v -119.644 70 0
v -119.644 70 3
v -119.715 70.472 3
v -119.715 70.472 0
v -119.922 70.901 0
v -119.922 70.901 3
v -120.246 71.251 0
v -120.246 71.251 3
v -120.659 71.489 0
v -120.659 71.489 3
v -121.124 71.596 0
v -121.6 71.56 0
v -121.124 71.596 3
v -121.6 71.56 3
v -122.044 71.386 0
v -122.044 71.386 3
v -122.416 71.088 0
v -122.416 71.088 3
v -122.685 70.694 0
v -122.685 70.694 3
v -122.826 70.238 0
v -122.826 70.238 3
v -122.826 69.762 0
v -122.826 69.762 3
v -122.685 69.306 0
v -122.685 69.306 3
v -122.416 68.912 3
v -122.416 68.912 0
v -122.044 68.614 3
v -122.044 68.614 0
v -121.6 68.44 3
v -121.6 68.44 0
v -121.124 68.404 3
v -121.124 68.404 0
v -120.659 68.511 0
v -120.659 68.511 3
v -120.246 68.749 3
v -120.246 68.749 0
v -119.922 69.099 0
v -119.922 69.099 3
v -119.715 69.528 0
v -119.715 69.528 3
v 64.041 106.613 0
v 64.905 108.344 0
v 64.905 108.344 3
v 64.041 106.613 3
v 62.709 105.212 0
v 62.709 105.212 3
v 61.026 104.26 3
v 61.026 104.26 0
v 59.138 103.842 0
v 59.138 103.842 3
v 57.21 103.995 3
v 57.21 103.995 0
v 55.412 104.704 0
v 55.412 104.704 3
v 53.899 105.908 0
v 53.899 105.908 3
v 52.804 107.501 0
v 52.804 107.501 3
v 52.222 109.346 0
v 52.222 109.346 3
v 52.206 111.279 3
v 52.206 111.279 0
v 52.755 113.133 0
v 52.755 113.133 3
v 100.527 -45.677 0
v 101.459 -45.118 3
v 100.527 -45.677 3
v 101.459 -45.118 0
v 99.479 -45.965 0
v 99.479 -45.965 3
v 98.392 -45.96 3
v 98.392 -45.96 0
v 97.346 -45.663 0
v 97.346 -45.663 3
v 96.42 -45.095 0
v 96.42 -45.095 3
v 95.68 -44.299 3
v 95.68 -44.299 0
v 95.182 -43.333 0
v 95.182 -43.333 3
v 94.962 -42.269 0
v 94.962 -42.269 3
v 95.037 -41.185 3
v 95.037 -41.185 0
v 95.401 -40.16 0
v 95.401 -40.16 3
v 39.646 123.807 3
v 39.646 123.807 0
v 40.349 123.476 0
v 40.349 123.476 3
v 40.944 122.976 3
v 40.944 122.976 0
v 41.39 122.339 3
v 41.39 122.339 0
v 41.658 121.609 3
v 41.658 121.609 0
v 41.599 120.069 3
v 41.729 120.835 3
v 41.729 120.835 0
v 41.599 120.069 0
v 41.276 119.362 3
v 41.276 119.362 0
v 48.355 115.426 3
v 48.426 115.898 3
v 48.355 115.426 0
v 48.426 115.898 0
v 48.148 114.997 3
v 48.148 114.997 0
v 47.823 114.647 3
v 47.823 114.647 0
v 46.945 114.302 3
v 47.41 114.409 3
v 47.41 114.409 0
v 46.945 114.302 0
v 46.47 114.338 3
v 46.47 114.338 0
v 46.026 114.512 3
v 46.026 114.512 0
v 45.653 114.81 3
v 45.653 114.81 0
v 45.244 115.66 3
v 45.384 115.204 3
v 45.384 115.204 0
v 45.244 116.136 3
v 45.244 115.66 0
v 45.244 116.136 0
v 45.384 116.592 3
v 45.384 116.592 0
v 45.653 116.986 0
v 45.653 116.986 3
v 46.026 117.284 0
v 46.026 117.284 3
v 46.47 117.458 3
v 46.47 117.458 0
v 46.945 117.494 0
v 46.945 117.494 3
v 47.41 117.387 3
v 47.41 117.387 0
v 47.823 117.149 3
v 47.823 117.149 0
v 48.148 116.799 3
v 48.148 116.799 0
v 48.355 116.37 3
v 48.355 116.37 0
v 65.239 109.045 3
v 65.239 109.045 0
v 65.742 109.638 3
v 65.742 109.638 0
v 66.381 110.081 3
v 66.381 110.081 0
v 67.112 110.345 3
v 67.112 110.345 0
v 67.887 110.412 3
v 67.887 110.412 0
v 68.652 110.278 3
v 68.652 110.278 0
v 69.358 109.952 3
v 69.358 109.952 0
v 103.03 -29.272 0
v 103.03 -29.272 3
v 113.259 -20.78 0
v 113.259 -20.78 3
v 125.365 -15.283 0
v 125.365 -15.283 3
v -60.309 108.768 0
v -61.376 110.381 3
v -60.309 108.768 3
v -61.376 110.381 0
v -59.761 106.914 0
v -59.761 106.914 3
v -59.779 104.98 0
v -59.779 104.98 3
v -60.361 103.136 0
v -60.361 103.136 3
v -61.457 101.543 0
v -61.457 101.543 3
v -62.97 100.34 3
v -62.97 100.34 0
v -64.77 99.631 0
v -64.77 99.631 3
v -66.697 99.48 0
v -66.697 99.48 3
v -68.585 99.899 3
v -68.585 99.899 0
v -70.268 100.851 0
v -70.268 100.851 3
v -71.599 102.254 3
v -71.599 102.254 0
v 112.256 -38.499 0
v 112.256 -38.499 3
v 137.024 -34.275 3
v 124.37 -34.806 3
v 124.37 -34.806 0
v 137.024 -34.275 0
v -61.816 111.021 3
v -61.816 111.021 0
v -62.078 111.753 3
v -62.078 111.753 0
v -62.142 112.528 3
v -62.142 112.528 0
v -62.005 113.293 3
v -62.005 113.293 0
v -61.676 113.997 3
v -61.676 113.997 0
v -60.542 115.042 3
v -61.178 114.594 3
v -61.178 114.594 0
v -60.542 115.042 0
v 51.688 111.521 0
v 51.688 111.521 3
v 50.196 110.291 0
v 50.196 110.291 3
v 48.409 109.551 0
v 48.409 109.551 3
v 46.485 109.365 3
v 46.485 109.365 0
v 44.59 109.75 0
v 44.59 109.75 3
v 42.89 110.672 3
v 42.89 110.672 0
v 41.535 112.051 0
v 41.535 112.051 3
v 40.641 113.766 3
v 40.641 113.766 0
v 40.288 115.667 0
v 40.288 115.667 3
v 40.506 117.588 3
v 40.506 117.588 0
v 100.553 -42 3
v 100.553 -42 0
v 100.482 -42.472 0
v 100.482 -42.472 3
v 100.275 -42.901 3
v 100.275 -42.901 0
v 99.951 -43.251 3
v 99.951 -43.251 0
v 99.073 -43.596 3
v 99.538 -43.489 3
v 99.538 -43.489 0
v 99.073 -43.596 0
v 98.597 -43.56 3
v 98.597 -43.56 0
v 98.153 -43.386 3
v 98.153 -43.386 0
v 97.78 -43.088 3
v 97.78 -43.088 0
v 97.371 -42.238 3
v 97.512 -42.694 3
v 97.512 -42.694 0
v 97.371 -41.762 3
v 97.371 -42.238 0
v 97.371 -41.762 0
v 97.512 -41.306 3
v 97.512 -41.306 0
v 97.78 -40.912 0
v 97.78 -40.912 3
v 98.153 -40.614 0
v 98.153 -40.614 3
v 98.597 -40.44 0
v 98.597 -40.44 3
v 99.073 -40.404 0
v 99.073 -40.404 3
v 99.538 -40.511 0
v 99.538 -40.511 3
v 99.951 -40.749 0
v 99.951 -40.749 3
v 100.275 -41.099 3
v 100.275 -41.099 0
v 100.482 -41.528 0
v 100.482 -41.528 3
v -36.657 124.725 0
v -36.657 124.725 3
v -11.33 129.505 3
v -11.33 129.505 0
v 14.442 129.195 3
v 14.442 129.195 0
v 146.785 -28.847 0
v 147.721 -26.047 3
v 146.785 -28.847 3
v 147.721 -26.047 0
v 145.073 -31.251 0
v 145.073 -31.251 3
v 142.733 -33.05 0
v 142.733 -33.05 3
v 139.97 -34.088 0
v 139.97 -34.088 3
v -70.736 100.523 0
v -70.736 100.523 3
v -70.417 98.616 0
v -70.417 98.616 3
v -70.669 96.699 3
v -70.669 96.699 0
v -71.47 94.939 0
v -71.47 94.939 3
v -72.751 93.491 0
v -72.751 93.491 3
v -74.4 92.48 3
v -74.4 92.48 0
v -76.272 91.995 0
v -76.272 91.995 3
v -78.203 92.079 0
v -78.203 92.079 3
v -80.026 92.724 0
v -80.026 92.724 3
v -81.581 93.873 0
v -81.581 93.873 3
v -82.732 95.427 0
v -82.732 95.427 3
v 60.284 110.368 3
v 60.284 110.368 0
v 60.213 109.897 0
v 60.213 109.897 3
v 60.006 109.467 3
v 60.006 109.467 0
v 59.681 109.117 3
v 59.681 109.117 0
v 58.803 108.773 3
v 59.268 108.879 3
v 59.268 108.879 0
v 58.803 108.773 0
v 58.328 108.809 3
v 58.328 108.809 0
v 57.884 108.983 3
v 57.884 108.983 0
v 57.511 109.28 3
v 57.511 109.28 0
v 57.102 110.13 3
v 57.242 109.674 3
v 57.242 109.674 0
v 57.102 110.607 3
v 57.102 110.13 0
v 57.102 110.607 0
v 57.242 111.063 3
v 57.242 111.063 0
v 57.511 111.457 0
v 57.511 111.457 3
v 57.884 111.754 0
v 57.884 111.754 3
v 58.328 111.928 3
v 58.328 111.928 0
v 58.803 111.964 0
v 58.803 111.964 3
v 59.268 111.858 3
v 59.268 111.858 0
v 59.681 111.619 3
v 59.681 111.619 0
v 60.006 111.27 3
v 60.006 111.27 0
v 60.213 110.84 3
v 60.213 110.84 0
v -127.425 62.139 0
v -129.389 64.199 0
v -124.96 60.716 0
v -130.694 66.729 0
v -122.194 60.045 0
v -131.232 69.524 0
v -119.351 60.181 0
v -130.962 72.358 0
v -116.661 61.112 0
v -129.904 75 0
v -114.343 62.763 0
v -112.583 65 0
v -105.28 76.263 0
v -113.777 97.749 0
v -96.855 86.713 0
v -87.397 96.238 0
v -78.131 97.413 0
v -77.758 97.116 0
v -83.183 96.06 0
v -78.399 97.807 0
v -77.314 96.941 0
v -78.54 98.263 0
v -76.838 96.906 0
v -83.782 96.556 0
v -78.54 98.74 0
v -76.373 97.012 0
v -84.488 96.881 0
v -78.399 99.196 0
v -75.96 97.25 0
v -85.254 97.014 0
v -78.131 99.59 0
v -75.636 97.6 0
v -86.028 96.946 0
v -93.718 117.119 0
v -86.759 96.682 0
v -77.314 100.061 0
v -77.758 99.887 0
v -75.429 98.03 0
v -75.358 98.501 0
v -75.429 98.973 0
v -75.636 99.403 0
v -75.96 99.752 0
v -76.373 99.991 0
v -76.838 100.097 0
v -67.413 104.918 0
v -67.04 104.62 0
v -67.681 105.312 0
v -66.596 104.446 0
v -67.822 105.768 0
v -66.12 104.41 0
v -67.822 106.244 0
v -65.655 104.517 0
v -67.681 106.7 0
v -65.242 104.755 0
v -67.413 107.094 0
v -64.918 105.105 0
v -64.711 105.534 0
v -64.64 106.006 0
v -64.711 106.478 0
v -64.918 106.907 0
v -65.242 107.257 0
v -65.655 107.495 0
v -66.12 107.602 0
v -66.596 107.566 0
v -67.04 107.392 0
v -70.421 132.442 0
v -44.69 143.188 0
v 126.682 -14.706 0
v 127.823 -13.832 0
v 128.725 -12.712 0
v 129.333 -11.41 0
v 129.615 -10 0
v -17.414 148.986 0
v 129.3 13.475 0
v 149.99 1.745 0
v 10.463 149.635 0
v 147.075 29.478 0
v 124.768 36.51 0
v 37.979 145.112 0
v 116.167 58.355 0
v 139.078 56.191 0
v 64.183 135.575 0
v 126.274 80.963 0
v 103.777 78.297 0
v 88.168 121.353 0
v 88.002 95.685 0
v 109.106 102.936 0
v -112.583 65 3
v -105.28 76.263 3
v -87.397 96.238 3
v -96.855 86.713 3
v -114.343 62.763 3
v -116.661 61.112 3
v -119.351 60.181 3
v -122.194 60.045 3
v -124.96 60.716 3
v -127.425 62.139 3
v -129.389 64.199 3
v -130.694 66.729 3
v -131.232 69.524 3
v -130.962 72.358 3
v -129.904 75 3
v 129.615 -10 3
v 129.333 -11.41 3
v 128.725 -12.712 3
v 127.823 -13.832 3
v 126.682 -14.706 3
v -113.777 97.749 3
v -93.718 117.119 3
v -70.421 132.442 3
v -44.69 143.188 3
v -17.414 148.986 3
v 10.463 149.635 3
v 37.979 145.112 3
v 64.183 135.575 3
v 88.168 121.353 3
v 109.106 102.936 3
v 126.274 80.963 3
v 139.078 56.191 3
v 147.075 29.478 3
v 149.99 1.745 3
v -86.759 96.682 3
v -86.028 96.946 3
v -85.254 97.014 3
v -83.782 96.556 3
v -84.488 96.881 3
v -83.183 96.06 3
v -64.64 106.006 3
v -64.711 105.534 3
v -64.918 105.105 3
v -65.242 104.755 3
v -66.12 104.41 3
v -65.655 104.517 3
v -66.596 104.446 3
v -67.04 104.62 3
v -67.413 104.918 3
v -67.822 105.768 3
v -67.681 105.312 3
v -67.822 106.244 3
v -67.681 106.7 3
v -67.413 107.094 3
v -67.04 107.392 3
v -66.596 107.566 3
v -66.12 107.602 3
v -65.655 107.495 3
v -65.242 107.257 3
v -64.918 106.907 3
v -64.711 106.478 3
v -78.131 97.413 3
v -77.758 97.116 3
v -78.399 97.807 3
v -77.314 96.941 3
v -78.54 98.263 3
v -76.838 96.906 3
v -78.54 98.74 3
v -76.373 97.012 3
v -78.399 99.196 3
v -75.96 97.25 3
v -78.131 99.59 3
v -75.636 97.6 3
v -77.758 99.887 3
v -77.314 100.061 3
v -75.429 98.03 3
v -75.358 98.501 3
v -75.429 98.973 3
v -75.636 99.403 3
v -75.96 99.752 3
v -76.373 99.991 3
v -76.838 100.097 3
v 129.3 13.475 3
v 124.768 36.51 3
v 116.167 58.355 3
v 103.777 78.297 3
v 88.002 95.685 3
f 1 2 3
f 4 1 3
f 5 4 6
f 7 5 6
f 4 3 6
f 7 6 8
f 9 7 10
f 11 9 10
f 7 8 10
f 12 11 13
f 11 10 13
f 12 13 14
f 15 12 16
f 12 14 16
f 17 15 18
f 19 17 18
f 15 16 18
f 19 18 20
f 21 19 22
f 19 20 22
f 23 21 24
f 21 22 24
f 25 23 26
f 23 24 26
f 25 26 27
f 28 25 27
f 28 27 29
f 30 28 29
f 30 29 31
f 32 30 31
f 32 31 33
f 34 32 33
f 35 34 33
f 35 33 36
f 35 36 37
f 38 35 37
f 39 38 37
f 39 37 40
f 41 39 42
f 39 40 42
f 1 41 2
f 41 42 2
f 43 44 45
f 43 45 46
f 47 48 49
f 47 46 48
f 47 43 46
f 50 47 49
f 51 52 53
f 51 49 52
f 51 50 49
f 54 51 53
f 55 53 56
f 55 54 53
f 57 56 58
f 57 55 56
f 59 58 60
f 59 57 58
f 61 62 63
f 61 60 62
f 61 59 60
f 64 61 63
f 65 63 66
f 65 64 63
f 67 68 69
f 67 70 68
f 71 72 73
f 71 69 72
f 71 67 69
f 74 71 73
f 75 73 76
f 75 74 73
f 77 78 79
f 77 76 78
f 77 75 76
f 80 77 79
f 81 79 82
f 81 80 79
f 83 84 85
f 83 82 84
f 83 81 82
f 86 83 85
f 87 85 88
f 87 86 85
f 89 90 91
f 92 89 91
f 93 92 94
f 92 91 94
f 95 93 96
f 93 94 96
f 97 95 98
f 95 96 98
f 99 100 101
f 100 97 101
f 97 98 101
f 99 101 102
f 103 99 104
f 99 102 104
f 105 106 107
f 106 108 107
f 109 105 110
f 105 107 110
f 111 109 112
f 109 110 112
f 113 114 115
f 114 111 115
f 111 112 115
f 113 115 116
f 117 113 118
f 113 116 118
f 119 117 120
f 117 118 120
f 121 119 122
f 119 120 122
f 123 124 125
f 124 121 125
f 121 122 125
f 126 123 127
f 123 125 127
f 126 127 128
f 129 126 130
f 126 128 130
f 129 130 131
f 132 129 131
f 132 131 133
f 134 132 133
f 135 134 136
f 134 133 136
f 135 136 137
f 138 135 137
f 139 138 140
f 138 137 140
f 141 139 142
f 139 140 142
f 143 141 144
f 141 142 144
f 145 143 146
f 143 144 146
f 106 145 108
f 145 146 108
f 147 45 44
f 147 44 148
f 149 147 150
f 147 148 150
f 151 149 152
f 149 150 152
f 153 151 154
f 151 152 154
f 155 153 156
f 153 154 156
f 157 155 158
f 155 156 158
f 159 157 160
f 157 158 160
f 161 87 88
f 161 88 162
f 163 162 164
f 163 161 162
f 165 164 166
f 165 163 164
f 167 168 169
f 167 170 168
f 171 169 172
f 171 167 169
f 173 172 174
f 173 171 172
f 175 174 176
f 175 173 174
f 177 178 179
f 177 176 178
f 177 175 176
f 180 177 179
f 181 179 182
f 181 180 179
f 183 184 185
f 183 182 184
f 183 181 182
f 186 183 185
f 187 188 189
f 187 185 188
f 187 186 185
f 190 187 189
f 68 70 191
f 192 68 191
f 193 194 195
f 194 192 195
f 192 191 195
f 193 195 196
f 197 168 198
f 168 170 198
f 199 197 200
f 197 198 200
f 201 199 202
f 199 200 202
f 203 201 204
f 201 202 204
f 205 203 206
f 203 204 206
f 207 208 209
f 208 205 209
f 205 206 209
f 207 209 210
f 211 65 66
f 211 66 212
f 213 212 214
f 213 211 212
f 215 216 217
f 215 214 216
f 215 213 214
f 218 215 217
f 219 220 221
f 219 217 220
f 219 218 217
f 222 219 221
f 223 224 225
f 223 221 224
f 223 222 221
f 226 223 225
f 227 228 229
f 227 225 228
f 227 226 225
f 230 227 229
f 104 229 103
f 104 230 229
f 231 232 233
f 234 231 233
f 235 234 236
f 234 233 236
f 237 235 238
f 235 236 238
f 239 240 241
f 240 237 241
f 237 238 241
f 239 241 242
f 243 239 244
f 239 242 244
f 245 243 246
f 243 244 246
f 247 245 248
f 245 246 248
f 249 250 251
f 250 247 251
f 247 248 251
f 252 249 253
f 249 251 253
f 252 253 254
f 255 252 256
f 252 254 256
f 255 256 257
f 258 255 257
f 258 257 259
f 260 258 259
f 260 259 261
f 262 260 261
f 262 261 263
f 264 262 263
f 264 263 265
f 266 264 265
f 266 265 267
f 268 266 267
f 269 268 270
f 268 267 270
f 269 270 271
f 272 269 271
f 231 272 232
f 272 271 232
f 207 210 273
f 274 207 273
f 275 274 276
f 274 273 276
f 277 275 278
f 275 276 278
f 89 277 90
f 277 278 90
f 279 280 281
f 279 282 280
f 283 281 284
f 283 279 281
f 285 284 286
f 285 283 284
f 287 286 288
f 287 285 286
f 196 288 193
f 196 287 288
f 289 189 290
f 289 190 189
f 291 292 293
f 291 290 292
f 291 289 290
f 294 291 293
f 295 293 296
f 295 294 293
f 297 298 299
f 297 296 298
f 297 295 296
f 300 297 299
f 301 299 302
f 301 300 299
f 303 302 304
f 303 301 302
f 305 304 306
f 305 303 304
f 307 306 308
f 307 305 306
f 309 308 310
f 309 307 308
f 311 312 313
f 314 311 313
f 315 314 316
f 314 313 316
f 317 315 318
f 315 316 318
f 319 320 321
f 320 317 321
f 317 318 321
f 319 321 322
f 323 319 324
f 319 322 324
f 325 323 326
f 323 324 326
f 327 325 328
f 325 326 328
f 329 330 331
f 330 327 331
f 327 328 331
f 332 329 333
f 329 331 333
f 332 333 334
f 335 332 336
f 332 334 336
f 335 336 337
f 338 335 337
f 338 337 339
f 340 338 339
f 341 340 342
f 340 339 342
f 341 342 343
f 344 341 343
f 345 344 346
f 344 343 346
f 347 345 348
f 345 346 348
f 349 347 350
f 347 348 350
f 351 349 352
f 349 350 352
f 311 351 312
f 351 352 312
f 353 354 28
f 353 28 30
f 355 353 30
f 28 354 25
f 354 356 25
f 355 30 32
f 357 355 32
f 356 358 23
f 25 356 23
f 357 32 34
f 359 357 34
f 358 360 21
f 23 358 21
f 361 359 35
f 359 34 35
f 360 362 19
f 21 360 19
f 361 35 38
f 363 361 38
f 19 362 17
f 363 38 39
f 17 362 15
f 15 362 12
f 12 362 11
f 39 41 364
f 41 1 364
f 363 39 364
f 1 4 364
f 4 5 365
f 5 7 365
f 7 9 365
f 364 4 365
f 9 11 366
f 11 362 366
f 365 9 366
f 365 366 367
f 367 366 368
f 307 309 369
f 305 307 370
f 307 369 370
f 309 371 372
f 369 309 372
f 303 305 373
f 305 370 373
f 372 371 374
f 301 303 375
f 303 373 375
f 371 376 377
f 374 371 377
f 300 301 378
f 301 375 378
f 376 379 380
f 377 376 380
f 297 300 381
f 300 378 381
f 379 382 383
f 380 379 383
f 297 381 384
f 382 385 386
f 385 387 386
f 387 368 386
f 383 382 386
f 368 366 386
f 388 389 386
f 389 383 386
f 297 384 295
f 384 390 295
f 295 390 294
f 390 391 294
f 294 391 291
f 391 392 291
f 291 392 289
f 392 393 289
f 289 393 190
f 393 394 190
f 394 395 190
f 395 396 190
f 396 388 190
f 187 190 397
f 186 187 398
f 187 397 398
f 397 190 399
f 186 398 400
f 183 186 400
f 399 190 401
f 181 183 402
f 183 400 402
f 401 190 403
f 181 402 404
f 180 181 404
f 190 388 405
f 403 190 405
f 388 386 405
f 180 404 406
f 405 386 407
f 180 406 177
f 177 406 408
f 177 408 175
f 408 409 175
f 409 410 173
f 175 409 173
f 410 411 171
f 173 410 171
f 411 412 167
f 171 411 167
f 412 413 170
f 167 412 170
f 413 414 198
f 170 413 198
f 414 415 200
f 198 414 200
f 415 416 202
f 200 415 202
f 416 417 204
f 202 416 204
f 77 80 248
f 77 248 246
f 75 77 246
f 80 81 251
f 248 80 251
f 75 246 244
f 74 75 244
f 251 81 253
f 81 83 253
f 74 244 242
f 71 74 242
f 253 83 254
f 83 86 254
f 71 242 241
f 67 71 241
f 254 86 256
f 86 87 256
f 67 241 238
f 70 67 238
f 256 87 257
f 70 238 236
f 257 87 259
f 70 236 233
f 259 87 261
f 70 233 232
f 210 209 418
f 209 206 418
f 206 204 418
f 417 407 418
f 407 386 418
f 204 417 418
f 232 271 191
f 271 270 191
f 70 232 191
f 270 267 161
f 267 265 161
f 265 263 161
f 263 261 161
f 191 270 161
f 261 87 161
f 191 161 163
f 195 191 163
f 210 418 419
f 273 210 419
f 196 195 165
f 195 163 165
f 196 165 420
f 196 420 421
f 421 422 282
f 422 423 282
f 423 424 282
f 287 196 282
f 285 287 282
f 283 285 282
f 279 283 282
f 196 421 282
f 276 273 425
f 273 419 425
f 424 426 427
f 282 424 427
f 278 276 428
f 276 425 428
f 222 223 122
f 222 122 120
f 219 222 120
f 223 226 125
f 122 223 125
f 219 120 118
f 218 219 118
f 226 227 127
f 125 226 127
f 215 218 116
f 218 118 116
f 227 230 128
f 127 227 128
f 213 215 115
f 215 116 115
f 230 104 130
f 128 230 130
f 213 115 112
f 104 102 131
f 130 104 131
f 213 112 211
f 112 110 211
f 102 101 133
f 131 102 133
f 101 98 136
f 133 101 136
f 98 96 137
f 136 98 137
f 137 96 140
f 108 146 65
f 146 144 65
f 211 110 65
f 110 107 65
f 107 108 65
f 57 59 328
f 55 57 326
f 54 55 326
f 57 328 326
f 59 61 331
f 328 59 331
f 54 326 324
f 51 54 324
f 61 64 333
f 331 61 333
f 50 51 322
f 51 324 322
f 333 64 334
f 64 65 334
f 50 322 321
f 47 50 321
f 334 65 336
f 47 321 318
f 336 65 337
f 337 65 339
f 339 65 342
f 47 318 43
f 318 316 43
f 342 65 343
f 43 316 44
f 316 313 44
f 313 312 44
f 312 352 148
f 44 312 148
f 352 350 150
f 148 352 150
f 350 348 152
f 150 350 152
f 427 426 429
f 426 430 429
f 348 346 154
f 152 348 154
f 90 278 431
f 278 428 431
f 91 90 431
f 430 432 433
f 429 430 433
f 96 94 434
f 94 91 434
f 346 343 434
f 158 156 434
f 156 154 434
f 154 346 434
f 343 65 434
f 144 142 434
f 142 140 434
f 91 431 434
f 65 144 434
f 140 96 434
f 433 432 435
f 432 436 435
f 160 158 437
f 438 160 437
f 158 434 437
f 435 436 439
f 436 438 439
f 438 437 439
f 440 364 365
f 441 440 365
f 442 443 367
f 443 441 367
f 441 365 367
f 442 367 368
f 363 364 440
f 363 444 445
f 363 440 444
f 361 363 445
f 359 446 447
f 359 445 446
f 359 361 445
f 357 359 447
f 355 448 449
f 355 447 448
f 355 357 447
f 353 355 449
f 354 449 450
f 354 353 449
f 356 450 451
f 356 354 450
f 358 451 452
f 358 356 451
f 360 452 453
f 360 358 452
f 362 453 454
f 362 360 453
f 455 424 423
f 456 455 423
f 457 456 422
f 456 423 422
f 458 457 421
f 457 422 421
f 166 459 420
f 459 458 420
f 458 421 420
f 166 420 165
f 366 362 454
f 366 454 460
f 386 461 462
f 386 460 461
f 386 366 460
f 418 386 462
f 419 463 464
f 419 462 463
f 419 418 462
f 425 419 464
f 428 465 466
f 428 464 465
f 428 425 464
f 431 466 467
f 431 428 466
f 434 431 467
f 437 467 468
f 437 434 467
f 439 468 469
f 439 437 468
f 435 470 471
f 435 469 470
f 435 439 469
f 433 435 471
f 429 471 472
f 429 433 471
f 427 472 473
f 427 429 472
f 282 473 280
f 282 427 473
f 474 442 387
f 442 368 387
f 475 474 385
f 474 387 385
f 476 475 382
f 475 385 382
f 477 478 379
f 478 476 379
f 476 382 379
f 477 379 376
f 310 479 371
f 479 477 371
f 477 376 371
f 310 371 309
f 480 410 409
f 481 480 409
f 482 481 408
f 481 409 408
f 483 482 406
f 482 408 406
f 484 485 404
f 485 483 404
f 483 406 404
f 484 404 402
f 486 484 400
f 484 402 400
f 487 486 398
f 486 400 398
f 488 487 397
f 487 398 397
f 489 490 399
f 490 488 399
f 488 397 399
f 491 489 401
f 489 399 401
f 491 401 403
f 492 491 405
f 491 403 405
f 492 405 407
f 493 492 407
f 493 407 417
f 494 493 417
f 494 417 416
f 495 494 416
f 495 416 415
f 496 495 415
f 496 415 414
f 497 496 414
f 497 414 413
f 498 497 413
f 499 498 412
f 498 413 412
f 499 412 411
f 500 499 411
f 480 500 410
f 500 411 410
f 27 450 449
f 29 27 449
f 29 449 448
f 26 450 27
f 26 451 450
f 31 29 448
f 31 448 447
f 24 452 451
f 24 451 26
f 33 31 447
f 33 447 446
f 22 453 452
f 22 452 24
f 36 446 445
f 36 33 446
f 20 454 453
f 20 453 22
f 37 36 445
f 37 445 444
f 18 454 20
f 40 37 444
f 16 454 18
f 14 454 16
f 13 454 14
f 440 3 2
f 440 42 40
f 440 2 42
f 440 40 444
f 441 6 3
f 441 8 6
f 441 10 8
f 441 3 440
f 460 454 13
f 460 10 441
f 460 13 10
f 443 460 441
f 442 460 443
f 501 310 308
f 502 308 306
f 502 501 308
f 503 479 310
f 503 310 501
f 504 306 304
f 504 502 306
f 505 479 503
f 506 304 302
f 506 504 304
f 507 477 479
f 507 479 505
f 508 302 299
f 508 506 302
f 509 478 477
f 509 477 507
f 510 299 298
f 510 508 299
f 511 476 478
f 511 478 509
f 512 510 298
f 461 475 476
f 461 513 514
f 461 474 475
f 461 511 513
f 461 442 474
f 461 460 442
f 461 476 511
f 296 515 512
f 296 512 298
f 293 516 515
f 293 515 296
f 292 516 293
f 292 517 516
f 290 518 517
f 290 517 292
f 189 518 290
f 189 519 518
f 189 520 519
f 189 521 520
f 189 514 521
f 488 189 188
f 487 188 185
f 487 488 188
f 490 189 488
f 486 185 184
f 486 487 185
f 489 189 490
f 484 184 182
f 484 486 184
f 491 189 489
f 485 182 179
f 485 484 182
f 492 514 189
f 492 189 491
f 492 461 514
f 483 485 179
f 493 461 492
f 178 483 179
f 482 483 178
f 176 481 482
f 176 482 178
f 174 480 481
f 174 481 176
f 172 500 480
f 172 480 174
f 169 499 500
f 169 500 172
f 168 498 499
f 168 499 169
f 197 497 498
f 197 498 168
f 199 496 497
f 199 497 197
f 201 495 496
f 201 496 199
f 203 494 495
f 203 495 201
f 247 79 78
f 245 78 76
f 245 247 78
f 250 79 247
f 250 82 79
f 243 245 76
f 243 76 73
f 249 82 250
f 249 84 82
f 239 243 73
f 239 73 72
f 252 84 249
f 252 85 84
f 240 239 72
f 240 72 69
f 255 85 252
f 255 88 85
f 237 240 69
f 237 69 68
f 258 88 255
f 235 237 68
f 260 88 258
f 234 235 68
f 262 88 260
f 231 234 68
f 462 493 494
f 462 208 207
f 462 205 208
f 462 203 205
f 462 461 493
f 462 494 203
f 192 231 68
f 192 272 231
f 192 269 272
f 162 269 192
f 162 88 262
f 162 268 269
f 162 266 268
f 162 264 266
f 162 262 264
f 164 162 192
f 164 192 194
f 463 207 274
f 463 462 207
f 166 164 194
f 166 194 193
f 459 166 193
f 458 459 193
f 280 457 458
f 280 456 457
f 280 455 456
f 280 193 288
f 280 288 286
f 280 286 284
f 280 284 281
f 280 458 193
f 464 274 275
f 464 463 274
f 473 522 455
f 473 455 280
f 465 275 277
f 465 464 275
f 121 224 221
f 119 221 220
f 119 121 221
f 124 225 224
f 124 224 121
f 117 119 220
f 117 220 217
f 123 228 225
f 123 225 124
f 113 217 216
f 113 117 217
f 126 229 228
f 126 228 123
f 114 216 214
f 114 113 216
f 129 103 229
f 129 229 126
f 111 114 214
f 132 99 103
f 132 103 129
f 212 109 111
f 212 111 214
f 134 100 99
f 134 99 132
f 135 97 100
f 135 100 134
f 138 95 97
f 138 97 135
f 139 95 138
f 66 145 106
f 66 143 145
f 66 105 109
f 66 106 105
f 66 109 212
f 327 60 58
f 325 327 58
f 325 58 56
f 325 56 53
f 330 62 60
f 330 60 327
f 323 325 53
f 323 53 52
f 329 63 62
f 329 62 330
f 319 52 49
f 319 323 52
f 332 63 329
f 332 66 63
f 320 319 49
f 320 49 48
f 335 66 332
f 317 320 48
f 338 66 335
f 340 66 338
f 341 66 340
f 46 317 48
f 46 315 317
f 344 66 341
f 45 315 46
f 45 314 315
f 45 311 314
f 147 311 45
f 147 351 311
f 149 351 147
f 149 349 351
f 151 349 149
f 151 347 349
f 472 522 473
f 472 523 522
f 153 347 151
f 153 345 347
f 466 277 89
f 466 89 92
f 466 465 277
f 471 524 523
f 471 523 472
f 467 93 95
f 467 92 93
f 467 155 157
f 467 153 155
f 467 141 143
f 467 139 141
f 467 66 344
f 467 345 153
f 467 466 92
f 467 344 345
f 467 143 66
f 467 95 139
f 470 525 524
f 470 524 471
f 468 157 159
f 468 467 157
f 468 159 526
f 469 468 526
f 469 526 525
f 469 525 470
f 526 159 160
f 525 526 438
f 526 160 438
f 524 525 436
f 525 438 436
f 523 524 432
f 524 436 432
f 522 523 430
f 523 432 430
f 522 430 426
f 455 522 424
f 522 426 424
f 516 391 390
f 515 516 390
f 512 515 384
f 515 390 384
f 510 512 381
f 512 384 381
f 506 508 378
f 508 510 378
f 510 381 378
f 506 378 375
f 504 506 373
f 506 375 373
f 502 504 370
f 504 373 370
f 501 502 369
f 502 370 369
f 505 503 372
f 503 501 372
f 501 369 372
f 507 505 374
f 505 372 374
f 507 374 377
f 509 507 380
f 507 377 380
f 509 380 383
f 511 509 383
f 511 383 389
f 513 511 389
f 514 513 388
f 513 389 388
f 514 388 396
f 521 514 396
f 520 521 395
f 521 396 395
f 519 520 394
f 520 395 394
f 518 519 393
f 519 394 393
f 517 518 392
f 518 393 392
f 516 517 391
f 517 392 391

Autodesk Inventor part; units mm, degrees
ref_plane "YZ Plane" through (0, 0, 0) normal (1, 0, 0) x (0, 1, 0)
ref_plane "XZ Plane" through (0, 0, 0) normal (0, 1, 0) x (-1, 0, 0)
ref_plane "XY Plane" through (0, 0, 0) normal (0, 0, 1) x (1, 0, 0)
sketch "スケッチ1" plane through (0, 0, 0) normal (0, 0, 1) x (1, 0, 0)
  arc A0 (137.8731, -24.3107) -> (-121.2436, 70) centre (0, 0) ccw construction
  arc A1 (147.7212, -26.0472) -> (-129.9038, 75) centre (0, 0) ccw
  arc A2 (128.025, -22.5743) -> (-112.5833, 65) centre (0, 0) ccw
  arc A3 (128.025, -22.5743) -> (147.7212, -26.0472) centre (137.8731, -24.3107) ccw
  arc A4 (-129.9038, 75) -> (-112.5833, 65) centre (-121.2436, 70) ccw
  line L0 (0, 0) -> (0, 140) construction
  circle A5 centre (-121.2436, 70) radius 1.6
  circle A6 centre (98.9531, -42) radius 1.6
  arc A7 (95.4012, -40.1605) -> (101.4586, -45.1181) centre (98.9531, -42) ccw
  circle A8 centre (-76.9577, 98.5013) radius 1.6
  circle A9 centre (-66.2399, 106.006) radius 1.6
  circle A10 centre (0, 0) radius 125 construction
  arc A11 (-82.7322, 95.4269) -> (-87.3972, 96.2379) centre (-85.3803, 94.017) ccw
  arc A12 (-60.5425, 115.0418) -> (-61.3759, 110.3808) centre (-59.1453, 112.387) ccw
  arc A13 (-82.7322, 95.4269) -> (-71.5988, 102.2537) centre (-76.9577, 98.5013) ccw
  line L1 (-71.5988, 102.2537) -> (-74.5649, 106.4898)
  line L2 (-74.5649, 106.4898) -> (-71.5988, 102.2537)
  arc A14 (-71.5988, 102.2537) -> (-61.3759, 110.3808) centre (-66.2399, 106.006) ccw
  circle A15 centre (58.6839, 110.3684) radius 1.6
  arc A16 (69.3579, 109.9522) -> (64.9046, 108.3435) centre (67.7573, 107.4148) ccw
  arc A17 (52.7549, 113.1332) -> (64.9046, 108.3435) centre (58.6839, 110.3684) ccw
  circle A18 centre (46.8258, 115.898) radius 1.6
  line L3 (52.7549, 113.1332) -> (54.9404, 117.82)
  line L4 (54.9404, 117.82) -> (52.7549, 113.1332)
  arc A19 (41.276, 119.3617) -> (52.7549, 113.1332) centre (46.8258, 115.898) ccw
  arc A20 (41.276, 119.3617) -> (39.6459, 123.8071) centre (38.731, 120.95) ccw
  arc A21 (69.3579, 109.9522) -> (39.6459, 123.8071) centre (48.7491, 104.5427) ccw
  circle A22 centre (98.9531, -42) radius 1.6 projected
  arc A23 (137.0238, -34.2746) -> (101.4586, -45.1181) centre (132.7776, -84.094) ccw
  arc A24 (125.3649, -15.283) -> (95.4012, -40.1605) centre (139.8007, -63.1537) ccw
  arc A25 (125.3649, -15.283) -> (129.6148, -10) centre (123.6326, -9.5385) ccw
  dimension "d0" = 140
  dimension "d1" = 10
  dimension "d4" = 60
  dimension "d5" = 100
  dimension "d6" = 3.2
  dimension "d17" = 8
  dimension "d19" = 3.2
  dimension "d21" = 250
  dimension "d22" = 22
  dimension "d23" = 28
  dimension "d26" = 3
  dimension "d30" = 60
  dimension "d53" = 3.2
  dimension "d54" = 21.307
  dimension "d56" = 50
  dimension "d57" = 6
  dimension "d58" = 50
  dimension "d59" = 10
extrude "押し出し1" add sketch "スケッチ1" along normal blind 3 contours A3 A2 A21 A4 A1 | A23 A7 A24 A25 A2 A3 | A2 L1 A13 A11 | A2 A12 A14 L1 | A2 A21 | A5
sketch "スケッチ3" plane through (0, 0, 0) normal (0, 0, 1) x (1, 0, 0)
  arc A0 (137.8731, -24.3107) -> (-121.2436, 70) centre (0, 0) ccw construction
  arc A1 (147.7212, -26.0472) -> (-129.9038, 75) centre (0, 0) ccw
  arc A2 (128.025, -22.5743) -> (147.7212, -26.0472) centre (137.8731, -24.3107) ccw
  arc A3 (-129.9038, 75) -> (-112.5833, 65) centre (-121.2436, 70) ccw
  line L0 (0, 0) -> (0, 140) construction
  circle A4 centre (-121.2436, 70) radius 1.6
  circle A5 centre (122.3274, -44) radius 1.6
  arc A6 (122.6106, -49.4927) -> (125.9627, -48.1273) centre (122.3274, -44) ccw
  line L1 (125.9627, -48.1273) -> (144.4827, -31.8149)
  circle A7 centre (102.9531, -46) radius 1.6
  arc A8 (102.4785, -41.5251) -> (103.1848, -50.494) centre (102.9531, -46) ccw
  line L2 (122.6106, -49.4927) -> (103.1848, -50.494)
  arc A9 (102.4785, -41.5251) -> (129.1083, -15.2002) centre (99.3141, -11.6925) ccw
  circle A10 centre (-76.9577, 98.5013) radius 1.6
  circle A11 centre (-66.2399, 106.006) radius 1.6
  circle A12 centre (0, 0) radius 125 construction
  arc A13 (-82.7322, 95.4269) -> (-87.3972, 96.2379) centre (-85.3803, 94.017) ccw
  arc A14 (-60.5425, 115.0418) -> (-61.3759, 110.3808) centre (-59.1453, 112.387) ccw
  arc A15 (-82.7322, 95.4269) -> (-71.5988, 102.2537) centre (-76.9577, 98.5013) ccw
  line L3 (-71.5988, 102.2537) -> (-74.5649, 106.4898)
  line L4 (-74.5649, 106.4898) -> (-71.5988, 102.2537)
  arc A16 (-71.5988, 102.2537) -> (-61.3759, 110.3808) centre (-66.2399, 106.006) ccw
  circle A17 centre (58.6839, 110.3684) radius 1.6
  arc A18 (69.3579, 109.9522) -> (64.9046, 108.3435) centre (67.7573, 107.4148) ccw
  arc A19 (52.7549, 113.1332) -> (64.9046, 108.3435) centre (58.6839, 110.3684) ccw
  circle A20 centre (46.8258, 115.898) radius 1.6
  line L5 (52.7549, 113.1332) -> (54.9404, 117.82)
  line L6 (54.9404, 117.82) -> (52.7549, 113.1332)
  arc A21 (41.276, 119.3617) -> (52.7549, 113.1332) centre (46.8258, 115.898) ccw
  arc A22 (41.276, 119.3617) -> (39.6459, 123.8071) centre (38.731, 120.95) ccw
  arc A23 (69.3579, 109.9522) -> (39.6459, 123.8071) centre (0, 0) ccw
  dimension "d34" = 140
  dimension "d35" = 10
  dimension "d36" = 60
  dimension "d37" = 100
  dimension "d38" = 3.2
  dimension "d39" = 11
  dimension "d40" = 9
  dimension "d41" = 30
  dimension "d42" = 3.2
  dimension "d43" = 250
  dimension "d44" = 22
  dimension "d45" = 28
  dimension "d46" = 3
  dimension "d47" = 60
extrude "押し出し3" add sketch "スケッチ3" along normal blind 3 contours A18 A19 L5 A23 | L5 A21 A22 A23
sketch "スケッチ4" plane through (0, 0, 3) normal (0, 0, 1) x (1, 0, 0)
  circle A0 centre (58.6839, 110.3684) radius 1.6 projected
  circle A1 centre (46.8258, 115.898) radius 1.6 projected
  circle A2 centre (98.9531, -42) radius 1.6 projected
  arc A3 (125.3649, -15.283) -> (129.6148, -10) centre (123.6326, -9.5385) ccw projected
  arc A4 (125.3649, -15.283) -> (95.4012, -40.1605) centre (139.8007, -63.1537) ccw projected
  arc A5 (95.4012, -40.1605) -> (101.4586, -45.1181) centre (98.9531, -42) ccw projected
  arc A6 (137.0238, -34.2746) -> (101.4586, -45.1181) centre (132.7776, -84.094) ccw projected
  arc A7 (137.0238, -34.2746) -> (147.7212, -26.0472) centre (137.8731, -24.3107) ccw projected
  arc A8 (147.7212, -26.0472) -> (-129.9038, 75) centre (0, 0) ccw projected
  arc A9 (-129.9038, 75) -> (-112.5833, 65) centre (-121.2436, 70) ccw projected
  arc A10 (-87.3972, 96.2379) -> (-112.5833, 65) centre (0, 0) ccw projected
  arc A11 (-82.7322, 95.4269) -> (-87.3972, 96.2379) centre (-85.3803, 94.017) ccw projected
  arc A12 (-82.7322, 95.4269) -> (-71.5988, 102.2537) centre (-76.9577, 98.5013) ccw projected
  arc A13 (-71.5988, 102.2537) -> (-61.3759, 110.3808) centre (-66.2399, 106.006) ccw projected
  arc A14 (-60.5425, 115.0418) -> (-61.3759, 110.3808) centre (-59.1453, 112.387) ccw projected
  arc A15 (39.6459, 123.8071) -> (-60.5425, 115.0418) centre (0, 0) ccw projected
  arc A16 (41.276, 119.3617) -> (39.6459, 123.8071) centre (38.731, 120.95) ccw projected
  arc A17 (41.276, 119.3617) -> (52.7549, 113.1332) centre (46.8258, 115.898) ccw projected
  arc A18 (52.7549, 113.1332) -> (64.9046, 108.3435) centre (58.6839, 110.3684) ccw projected
  arc A19 (69.3579, 109.9522) -> (64.9046, 108.3435) centre (67.7573, 107.4148) ccw projected
  arc A20 (129.6148, -10) -> (69.3579, 109.9522) centre (0, 0) ccw projected
  circle A21 centre (-66.2399, 106.006) radius 1.6 projected
  circle A22 centre (-76.9577, 98.5013) radius 1.6 projected
  circle A23 centre (-121.2436, 70) radius 1.6
  dimension "d60" = 3.2
extrude "押し出し4" cut sketch "スケッチ4" against normal blind 10 contours A23
properties part number "RailWay" material "アクリル、クリア"
